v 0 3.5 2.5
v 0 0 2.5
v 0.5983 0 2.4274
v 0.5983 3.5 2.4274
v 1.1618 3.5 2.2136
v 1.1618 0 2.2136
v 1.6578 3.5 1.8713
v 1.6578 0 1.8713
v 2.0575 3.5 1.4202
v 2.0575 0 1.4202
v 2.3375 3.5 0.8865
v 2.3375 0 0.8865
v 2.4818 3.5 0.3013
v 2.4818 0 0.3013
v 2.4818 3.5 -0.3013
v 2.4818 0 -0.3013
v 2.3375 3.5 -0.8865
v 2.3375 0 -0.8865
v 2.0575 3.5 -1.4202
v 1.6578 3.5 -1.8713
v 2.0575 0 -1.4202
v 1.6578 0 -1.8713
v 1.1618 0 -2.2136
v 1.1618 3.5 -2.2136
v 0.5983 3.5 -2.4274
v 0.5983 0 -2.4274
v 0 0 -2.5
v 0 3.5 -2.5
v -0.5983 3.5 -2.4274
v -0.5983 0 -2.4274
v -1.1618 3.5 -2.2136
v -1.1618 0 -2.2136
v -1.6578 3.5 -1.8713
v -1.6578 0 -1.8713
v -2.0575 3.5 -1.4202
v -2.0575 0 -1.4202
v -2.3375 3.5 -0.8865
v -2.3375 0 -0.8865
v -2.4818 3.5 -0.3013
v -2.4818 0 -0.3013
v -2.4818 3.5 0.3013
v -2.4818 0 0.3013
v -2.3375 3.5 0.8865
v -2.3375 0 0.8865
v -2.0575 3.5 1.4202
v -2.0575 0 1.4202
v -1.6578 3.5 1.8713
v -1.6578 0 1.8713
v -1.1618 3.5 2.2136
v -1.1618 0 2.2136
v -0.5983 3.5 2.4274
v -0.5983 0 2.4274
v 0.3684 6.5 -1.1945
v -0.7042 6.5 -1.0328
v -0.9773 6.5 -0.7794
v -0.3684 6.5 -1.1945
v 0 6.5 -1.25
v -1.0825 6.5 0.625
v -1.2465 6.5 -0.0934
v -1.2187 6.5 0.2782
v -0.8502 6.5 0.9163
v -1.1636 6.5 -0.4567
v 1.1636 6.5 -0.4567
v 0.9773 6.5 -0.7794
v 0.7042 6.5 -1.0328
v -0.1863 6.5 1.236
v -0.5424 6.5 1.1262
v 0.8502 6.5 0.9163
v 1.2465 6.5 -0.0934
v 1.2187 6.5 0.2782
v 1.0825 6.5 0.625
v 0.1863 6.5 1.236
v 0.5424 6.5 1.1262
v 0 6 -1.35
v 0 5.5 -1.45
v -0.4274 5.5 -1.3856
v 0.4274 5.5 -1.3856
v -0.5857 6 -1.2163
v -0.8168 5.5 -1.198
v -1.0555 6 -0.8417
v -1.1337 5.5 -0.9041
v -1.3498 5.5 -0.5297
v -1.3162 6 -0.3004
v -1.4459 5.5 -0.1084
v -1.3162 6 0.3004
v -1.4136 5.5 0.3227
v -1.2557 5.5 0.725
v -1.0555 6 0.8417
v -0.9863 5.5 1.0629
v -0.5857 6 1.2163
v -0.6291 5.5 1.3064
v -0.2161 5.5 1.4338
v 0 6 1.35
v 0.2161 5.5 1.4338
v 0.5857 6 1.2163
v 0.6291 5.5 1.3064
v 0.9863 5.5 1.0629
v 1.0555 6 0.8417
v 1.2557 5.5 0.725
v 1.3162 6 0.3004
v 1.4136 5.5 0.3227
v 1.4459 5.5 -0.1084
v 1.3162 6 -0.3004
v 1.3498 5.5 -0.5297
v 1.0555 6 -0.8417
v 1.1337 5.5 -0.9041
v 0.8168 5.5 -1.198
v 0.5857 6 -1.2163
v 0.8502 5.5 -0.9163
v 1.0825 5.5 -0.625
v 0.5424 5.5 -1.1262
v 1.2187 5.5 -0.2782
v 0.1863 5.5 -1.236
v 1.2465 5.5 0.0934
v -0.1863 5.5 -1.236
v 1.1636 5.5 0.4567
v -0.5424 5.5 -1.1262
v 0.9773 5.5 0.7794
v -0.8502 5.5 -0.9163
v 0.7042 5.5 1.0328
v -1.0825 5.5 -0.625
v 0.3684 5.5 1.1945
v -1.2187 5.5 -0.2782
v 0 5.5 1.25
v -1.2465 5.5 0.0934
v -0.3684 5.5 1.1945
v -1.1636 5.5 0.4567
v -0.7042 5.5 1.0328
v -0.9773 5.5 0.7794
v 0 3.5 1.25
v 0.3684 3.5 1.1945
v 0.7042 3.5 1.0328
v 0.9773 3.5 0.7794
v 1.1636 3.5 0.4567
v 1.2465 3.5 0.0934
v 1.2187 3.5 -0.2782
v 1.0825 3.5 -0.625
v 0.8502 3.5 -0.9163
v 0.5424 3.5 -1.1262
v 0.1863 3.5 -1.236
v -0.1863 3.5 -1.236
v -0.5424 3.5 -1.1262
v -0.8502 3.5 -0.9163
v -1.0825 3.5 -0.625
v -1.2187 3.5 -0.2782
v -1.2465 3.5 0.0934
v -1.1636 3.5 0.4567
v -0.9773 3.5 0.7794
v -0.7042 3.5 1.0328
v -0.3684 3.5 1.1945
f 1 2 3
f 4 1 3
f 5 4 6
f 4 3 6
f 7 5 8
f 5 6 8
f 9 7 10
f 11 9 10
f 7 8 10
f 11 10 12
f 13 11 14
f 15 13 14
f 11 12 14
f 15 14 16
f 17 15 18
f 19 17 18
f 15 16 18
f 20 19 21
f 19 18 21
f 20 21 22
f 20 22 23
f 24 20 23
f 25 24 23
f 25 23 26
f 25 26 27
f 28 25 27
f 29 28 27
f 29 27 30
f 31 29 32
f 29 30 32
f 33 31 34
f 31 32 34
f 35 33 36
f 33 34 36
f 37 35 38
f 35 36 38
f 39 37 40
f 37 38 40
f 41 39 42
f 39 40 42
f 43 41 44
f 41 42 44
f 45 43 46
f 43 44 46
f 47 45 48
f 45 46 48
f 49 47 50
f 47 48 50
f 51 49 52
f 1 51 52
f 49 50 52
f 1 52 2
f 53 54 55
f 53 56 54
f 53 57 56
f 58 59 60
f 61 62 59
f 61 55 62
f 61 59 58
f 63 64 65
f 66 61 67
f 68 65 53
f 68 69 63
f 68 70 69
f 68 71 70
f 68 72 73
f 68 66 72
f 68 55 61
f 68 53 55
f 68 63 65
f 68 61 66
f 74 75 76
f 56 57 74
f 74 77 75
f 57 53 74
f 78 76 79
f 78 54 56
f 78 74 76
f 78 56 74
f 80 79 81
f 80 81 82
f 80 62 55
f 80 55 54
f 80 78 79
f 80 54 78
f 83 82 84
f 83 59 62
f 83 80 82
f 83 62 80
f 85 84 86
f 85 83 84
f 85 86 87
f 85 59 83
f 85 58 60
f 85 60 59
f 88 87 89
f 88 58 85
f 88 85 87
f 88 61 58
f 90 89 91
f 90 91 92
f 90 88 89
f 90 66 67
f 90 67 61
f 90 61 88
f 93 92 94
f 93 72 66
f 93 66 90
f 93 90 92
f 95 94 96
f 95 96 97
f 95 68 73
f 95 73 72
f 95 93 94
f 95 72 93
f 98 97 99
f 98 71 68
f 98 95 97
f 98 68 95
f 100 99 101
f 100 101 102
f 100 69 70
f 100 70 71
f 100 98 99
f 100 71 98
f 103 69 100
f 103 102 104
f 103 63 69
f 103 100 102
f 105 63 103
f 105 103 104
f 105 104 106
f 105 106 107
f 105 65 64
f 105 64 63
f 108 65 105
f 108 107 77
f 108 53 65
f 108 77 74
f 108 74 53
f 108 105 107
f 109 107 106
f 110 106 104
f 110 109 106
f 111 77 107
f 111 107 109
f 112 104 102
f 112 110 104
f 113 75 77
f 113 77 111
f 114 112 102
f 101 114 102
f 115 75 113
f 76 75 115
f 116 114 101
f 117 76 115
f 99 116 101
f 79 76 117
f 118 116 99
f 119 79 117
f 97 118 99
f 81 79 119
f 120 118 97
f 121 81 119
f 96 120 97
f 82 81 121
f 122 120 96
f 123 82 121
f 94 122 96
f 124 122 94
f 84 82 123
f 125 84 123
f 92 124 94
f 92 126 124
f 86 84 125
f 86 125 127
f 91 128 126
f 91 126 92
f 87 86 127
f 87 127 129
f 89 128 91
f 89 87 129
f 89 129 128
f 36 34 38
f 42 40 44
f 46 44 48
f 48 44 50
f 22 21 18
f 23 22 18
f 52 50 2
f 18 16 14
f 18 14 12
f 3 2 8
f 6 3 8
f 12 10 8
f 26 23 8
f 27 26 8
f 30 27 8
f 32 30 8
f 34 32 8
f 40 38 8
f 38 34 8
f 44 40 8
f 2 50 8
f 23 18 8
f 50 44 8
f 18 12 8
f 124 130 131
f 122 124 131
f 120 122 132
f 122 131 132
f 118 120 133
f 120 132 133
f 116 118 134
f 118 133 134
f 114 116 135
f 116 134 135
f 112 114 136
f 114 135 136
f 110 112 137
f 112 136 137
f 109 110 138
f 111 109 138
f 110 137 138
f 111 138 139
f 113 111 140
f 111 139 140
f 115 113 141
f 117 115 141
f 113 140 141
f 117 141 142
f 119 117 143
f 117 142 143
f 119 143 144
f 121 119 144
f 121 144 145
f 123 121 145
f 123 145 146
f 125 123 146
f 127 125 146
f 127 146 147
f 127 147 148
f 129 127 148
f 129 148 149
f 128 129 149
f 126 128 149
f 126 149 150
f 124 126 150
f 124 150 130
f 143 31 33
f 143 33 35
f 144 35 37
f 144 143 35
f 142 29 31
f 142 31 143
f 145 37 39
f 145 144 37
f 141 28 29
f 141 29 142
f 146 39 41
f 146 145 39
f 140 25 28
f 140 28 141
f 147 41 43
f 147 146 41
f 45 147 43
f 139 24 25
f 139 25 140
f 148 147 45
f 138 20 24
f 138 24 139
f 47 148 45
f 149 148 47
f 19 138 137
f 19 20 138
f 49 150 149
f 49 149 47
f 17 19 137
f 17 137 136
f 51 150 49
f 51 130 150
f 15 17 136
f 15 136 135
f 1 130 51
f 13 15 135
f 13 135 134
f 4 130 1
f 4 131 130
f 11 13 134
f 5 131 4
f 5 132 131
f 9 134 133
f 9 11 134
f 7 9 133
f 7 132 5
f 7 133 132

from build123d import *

# Parameters (mm, degrees)
SKETCH1_R           = 2.5
BOSS_EXTRUDE1_DEPTH = 3.5
SKETCH2_R           = 1.25
BOSS_EXTRUDE2_DEPTH = 3


with BuildPart() as part:
    # Sketch1 → Boss-Extrude1 (new body)
    with BuildSketch(Plane(origin=(0, 0, 0), x_dir=(1, 0, 0), z_dir=(0, 1, 0))):
        with Locations(Location((0, 0, 0), (0, 0, 270))):
            Circle(SKETCH1_R)
    extrude(amount=BOSS_EXTRUDE1_DEPTH)

    # Sketch2 → Boss-Extrude2 (add)
    with BuildSketch(Plane(origin=(0, 3.5, 0), x_dir=(1, 0, 0), z_dir=(0, 1, 0))):
        with Locations(Location((0, 0, 0), (0, 0, 270))):
            Circle(SKETCH2_R)
    extrude(amount=BOSS_EXTRUDE2_DEPTH)

    # Sketch3 → Revolve1 (revolve)
    with BuildSketch(Plane.XY, mode=Mode.PRIVATE) as revolve1_sk:
        Polygon((1.25, 6.5), (1.25, 5.5), (1.45, 5.5), align=None)
    revolve(revolve1_sk.sketch.rotate(Axis((0, 0, 0), (0, 1, 0)), 90), axis=Axis((0, 0, 0), (0, 1, 0)))


solid = part.part
